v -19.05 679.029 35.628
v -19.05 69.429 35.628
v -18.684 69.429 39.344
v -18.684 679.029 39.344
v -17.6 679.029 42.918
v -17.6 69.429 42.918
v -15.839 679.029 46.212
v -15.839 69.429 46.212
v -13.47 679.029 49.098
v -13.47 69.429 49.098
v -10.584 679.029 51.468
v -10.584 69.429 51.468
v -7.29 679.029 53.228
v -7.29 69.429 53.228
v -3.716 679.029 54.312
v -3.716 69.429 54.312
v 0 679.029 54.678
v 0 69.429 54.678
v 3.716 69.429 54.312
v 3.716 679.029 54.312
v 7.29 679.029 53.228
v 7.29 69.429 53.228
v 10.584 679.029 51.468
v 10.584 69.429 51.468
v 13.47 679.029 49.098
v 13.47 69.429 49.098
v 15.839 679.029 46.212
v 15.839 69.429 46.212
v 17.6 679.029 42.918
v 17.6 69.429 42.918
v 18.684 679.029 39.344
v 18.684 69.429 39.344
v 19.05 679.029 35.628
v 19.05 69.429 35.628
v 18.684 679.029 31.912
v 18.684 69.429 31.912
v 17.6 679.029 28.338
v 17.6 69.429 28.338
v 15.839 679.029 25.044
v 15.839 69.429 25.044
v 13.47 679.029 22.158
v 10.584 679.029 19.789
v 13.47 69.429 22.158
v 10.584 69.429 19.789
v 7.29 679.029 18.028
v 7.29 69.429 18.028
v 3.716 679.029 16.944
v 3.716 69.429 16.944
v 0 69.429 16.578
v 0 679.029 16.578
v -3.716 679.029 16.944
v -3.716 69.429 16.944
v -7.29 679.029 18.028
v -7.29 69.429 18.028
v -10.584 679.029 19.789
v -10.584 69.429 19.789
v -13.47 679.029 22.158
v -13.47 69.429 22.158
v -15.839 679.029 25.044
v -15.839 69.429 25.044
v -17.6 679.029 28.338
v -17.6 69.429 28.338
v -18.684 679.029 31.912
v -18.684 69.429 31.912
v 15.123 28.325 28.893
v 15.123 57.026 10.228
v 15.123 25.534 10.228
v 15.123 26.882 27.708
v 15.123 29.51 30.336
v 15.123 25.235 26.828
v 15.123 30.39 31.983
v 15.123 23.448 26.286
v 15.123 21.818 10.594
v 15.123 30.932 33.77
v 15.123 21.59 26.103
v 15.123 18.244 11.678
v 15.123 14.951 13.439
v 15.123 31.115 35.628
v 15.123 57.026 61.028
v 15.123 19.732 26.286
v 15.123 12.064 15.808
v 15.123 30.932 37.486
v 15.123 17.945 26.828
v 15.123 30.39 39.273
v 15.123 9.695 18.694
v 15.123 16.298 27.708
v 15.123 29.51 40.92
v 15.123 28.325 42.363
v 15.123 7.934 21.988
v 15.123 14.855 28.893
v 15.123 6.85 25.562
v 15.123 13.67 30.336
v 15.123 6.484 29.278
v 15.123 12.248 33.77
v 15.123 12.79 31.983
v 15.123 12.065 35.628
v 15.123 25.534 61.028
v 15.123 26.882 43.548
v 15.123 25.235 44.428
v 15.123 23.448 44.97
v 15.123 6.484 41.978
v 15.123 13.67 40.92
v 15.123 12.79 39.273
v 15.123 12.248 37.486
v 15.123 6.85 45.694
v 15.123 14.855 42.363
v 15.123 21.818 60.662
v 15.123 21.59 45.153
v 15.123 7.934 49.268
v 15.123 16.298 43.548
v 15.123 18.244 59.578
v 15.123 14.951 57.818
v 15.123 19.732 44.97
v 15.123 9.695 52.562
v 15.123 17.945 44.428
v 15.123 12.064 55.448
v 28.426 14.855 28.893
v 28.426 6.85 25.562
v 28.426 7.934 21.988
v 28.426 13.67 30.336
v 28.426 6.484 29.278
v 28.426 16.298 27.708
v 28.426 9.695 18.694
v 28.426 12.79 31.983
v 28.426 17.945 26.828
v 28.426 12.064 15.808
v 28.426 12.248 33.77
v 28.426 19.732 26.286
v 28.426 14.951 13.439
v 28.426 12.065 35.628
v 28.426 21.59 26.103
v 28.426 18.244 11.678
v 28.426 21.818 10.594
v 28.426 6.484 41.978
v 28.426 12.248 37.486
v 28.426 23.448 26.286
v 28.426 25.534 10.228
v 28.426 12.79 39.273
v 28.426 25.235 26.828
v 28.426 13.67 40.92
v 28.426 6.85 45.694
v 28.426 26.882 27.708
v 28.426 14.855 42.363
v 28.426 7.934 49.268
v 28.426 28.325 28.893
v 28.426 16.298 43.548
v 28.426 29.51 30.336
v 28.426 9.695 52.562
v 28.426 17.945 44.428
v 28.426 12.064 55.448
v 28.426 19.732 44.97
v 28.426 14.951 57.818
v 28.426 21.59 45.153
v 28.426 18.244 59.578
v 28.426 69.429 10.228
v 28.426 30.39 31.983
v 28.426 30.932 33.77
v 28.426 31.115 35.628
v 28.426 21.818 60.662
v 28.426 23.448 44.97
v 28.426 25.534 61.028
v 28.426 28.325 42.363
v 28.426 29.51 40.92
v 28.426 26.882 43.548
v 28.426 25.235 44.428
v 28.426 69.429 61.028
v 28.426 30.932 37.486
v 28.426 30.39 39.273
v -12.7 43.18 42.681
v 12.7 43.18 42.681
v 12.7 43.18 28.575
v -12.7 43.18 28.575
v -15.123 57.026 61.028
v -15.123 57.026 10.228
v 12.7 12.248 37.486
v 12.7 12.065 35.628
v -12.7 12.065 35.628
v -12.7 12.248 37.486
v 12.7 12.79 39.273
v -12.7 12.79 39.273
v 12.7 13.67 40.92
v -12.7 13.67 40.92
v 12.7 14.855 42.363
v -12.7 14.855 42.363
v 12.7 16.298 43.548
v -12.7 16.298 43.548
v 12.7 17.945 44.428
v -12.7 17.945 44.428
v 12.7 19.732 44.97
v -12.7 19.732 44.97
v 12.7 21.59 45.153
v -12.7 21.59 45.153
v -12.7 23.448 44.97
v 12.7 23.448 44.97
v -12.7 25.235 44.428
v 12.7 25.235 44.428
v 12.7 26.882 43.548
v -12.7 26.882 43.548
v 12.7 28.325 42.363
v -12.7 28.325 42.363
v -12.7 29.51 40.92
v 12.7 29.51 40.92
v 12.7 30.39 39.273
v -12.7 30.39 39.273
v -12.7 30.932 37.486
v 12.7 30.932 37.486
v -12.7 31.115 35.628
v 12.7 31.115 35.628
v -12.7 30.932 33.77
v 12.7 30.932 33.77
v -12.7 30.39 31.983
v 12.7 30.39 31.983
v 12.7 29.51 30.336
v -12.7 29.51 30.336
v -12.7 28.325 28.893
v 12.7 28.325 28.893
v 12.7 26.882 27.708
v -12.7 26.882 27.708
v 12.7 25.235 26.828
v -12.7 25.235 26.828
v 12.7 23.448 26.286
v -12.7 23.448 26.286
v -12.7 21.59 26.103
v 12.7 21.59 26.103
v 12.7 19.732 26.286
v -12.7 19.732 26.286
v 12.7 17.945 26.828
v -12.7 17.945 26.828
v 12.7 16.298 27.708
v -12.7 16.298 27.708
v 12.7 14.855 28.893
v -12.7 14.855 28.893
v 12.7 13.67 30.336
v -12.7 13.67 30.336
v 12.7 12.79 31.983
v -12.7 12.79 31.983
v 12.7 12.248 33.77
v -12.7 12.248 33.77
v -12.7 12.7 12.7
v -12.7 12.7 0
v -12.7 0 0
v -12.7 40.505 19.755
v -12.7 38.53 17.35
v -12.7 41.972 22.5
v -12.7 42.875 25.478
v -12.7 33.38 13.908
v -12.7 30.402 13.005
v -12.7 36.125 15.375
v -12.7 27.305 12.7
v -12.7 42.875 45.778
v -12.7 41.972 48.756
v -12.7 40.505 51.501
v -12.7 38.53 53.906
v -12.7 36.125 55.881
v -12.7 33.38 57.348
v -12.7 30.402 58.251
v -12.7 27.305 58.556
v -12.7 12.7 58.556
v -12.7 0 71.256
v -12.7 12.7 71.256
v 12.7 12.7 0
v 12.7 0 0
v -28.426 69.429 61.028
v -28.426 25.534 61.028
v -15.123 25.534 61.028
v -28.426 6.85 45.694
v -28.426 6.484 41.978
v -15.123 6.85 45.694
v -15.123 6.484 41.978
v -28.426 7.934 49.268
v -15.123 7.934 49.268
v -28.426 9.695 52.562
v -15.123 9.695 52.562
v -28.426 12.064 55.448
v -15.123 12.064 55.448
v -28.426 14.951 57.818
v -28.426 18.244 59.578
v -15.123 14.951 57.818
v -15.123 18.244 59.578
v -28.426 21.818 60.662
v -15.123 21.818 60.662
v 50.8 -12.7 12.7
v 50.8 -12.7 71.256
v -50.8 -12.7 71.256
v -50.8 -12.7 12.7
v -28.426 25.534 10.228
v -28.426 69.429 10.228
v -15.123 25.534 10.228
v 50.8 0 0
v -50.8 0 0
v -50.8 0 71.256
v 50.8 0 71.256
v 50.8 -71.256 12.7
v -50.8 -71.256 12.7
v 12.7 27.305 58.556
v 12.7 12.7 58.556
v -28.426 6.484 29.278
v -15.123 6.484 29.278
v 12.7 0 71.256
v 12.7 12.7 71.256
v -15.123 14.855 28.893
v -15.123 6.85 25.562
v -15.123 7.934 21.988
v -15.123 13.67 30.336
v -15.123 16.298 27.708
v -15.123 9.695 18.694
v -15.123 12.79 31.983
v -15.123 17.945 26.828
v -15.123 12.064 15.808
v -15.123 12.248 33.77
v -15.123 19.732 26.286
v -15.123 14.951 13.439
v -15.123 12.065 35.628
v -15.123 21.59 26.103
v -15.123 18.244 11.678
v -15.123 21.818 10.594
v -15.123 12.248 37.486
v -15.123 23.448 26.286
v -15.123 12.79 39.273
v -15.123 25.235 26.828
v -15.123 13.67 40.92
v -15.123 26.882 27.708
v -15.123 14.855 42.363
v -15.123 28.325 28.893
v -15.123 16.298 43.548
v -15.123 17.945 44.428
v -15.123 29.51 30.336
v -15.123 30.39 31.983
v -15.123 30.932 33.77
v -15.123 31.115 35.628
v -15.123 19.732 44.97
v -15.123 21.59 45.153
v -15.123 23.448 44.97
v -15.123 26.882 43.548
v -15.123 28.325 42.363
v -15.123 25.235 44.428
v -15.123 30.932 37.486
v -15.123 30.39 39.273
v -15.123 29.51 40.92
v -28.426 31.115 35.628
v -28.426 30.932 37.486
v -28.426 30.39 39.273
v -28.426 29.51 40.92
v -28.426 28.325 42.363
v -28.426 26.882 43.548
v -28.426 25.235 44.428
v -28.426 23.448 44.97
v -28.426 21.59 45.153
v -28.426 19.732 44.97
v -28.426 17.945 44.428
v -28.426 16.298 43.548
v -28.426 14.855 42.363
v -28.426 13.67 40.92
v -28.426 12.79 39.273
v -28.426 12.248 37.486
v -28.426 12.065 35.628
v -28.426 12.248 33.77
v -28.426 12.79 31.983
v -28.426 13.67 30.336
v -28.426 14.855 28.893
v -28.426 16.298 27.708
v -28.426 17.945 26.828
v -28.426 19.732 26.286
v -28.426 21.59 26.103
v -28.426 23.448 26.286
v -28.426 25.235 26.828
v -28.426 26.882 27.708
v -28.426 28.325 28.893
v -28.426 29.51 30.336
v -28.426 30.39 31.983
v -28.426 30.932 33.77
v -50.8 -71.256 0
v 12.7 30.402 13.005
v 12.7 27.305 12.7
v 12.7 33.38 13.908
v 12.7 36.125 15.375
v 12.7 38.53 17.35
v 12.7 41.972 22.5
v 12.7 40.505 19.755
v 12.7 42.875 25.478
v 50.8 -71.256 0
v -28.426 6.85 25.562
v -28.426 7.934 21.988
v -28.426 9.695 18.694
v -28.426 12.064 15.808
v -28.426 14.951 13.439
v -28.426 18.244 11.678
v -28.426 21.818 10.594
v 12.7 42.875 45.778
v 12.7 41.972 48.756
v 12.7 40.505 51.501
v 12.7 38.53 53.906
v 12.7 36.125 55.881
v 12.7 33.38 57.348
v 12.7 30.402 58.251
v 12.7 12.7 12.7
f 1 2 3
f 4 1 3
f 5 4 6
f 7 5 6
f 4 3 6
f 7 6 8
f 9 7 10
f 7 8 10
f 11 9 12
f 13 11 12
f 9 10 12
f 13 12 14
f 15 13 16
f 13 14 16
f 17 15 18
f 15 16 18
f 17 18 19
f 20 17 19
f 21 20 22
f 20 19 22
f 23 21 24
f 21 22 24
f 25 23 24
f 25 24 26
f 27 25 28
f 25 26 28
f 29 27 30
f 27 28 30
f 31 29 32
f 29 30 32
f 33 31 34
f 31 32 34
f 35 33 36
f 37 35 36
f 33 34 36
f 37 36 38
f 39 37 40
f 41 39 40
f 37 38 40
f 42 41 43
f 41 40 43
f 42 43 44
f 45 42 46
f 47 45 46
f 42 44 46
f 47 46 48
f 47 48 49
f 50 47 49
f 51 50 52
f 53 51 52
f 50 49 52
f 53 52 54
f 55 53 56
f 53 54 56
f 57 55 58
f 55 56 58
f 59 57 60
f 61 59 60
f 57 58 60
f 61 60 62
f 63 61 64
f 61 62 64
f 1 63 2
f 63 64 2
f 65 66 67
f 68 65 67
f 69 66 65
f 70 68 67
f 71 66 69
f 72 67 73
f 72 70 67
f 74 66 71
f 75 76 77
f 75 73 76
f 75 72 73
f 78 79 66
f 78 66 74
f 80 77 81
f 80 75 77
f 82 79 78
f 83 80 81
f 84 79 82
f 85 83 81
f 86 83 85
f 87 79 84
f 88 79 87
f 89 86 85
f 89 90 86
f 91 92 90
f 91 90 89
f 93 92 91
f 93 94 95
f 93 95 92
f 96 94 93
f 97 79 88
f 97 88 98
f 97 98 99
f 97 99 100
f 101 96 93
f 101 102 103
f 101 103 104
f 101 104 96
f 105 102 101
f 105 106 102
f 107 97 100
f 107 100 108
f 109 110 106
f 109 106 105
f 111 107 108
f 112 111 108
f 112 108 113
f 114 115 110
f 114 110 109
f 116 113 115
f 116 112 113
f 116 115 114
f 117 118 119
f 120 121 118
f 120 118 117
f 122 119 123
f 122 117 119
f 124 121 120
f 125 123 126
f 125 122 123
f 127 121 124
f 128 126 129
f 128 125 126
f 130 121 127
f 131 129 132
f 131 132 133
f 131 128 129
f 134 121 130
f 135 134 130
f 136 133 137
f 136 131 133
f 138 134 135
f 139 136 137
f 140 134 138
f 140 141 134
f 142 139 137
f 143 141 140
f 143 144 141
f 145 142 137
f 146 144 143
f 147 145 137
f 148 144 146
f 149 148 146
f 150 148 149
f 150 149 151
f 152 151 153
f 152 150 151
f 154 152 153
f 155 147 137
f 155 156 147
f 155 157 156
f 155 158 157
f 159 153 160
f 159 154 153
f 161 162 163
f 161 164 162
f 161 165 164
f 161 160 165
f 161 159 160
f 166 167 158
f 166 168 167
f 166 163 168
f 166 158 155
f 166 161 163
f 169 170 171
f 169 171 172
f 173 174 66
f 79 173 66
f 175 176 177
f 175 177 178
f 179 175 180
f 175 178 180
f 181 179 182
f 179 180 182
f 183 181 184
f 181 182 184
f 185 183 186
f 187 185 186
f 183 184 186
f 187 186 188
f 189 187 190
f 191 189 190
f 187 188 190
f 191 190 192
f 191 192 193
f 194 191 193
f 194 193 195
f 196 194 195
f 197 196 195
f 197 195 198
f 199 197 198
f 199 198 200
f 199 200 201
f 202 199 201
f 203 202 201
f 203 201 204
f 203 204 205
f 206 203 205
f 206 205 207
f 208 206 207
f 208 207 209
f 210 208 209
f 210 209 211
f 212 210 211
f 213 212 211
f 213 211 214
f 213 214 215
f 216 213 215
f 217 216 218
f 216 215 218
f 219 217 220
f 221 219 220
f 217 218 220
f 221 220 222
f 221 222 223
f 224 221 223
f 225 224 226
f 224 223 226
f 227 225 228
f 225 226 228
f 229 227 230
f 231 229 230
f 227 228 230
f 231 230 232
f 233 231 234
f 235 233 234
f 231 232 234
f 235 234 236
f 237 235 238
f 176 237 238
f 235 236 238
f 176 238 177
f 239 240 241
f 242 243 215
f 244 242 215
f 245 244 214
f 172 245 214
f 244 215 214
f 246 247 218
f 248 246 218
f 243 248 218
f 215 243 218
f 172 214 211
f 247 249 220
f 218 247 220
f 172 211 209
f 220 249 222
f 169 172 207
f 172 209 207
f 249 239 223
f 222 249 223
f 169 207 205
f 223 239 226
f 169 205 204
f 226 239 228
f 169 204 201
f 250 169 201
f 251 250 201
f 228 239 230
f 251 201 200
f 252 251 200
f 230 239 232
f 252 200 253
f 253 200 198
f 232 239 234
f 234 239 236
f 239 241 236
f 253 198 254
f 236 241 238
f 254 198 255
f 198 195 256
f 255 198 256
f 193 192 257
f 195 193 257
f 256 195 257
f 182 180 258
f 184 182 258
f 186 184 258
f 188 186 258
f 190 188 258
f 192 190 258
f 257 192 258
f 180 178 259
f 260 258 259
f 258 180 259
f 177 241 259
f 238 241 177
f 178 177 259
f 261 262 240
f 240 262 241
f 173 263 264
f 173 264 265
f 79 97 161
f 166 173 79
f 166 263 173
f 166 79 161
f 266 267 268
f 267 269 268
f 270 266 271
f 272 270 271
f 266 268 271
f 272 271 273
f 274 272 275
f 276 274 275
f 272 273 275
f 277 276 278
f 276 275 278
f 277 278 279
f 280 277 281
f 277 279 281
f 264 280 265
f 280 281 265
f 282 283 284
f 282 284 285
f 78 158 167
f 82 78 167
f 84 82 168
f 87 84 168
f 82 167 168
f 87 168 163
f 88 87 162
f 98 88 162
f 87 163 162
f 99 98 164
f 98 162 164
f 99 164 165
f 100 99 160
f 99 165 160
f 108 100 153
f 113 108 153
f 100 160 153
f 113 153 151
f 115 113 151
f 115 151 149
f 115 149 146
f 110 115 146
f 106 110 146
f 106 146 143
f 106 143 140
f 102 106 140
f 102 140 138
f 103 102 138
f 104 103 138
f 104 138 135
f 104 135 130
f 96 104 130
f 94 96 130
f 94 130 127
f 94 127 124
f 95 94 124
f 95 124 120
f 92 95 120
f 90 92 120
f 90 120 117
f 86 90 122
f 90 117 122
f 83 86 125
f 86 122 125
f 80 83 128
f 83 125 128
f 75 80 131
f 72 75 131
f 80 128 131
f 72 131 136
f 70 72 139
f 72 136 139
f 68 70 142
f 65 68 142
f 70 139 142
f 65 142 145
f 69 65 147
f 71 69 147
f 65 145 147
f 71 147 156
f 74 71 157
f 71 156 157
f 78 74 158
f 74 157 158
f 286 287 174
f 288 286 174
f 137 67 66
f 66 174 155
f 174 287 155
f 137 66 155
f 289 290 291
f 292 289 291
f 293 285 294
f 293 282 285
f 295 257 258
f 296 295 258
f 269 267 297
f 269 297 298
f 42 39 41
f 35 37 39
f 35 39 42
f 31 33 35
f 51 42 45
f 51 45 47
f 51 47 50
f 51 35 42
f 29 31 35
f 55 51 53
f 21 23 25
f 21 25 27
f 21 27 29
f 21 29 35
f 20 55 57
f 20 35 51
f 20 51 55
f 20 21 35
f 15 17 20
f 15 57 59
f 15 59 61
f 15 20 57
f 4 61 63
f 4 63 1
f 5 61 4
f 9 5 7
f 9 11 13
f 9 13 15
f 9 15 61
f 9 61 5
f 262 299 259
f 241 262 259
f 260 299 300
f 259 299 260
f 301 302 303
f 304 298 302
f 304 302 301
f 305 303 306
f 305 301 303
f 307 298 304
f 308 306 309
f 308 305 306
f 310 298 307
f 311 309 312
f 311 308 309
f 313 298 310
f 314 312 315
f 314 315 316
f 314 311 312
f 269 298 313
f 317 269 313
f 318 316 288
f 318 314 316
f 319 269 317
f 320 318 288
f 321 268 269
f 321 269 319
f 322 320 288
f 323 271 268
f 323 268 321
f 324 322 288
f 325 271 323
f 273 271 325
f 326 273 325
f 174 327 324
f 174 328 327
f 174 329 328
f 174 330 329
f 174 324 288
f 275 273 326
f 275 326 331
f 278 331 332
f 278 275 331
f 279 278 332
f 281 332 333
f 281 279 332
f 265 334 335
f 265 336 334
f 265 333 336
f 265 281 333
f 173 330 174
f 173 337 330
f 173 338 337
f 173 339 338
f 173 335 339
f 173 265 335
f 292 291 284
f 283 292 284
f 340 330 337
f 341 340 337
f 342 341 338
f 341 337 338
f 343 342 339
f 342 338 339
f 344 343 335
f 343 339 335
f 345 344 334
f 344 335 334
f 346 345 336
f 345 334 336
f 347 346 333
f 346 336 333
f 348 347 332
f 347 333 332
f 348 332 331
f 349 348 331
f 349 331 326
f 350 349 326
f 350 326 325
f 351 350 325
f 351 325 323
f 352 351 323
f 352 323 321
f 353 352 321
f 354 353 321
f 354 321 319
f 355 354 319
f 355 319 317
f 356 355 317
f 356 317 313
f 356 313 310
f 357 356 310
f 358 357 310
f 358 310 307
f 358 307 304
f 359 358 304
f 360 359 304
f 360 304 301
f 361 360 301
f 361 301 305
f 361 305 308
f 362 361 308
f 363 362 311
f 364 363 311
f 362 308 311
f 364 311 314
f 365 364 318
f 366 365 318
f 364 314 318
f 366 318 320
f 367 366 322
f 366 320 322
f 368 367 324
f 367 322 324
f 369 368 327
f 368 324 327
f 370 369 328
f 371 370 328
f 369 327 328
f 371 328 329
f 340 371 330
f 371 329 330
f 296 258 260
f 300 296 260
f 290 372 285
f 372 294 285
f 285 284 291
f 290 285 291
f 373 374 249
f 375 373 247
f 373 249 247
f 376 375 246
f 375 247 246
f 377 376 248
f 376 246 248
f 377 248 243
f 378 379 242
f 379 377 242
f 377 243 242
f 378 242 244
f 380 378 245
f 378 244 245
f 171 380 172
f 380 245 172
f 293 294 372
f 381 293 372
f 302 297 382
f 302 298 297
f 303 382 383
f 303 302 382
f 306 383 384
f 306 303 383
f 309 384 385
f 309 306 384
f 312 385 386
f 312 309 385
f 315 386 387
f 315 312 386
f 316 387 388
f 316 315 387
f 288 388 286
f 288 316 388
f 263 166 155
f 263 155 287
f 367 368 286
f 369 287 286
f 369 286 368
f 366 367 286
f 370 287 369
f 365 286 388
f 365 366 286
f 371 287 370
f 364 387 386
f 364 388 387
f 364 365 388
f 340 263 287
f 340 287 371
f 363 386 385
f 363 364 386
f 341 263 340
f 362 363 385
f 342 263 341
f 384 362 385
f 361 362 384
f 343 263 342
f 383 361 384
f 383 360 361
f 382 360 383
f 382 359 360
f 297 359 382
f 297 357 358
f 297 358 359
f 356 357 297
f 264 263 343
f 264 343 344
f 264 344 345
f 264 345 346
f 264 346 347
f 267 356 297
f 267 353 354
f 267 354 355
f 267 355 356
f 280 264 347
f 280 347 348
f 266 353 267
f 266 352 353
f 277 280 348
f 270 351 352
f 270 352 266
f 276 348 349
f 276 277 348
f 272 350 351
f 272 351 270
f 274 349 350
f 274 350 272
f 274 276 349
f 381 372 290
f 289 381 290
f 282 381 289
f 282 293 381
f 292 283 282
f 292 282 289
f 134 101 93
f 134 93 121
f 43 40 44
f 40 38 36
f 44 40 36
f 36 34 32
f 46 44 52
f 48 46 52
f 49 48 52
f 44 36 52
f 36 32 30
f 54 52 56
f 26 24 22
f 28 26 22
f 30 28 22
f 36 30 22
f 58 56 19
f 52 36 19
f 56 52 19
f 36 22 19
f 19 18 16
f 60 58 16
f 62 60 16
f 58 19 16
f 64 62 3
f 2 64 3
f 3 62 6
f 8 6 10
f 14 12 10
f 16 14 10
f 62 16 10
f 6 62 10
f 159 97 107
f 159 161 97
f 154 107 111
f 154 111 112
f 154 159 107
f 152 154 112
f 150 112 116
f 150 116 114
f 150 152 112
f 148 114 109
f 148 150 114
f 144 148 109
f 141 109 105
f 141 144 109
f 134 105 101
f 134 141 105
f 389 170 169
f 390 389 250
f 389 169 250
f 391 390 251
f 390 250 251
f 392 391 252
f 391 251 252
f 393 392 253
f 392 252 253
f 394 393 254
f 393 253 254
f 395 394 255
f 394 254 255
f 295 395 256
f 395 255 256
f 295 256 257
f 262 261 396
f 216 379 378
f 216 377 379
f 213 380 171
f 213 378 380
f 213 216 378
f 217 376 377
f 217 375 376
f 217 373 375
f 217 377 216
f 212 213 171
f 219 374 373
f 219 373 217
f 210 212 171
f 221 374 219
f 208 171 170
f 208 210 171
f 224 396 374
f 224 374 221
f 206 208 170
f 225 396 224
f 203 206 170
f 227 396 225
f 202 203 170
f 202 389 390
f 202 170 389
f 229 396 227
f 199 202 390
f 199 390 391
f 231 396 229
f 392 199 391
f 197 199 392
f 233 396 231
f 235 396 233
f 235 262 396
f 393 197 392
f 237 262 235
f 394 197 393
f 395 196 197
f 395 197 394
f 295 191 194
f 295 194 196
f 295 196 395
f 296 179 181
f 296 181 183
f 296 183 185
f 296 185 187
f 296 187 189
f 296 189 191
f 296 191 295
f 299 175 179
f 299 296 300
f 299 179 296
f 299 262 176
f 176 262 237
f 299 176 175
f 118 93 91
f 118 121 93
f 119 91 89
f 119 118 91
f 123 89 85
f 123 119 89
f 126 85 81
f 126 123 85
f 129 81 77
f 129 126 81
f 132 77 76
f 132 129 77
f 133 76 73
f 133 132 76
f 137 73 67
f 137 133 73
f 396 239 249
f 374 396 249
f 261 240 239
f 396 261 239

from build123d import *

# Parameters (mm, degrees)
F1_DEPTH  = 50.8
F2_W      = 25.4
F2_H      = 71.2560223817
F3_DEPTH  = 43.18
F4_R      = 9.525
F5_DEPTH  = 63.501
F7_DEPTH  = 63.501
F10_DEPTH = 25.4
F11_R     = 19.05
F12_R     = 9.525
F13_DEPTH = 79.2273342619
F14_R     = 19.05
F15_DEPTH = 609.6


with BuildPart() as f1:
    # F0 (on Right) → F1 (new body, symmetric)
    with BuildSketch(Plane.YZ):
        Polygon((-71.2560223817, 0), (0, 0), (0, 71.2560223817), (-12.7, 71.2560223817), (-12.7, 12.7), (-71.2560223817, 12.7), align=None)
    extrude(amount=F1_DEPTH, both=True)


with BuildPart() as f3:
    # F2 (on face) → F3 (new body)
    with BuildSketch(Plane(origin=(0, 0, 0), x_dir=(-1, 0, 0), z_dir=(0, 1, 0))):
        with Locations((0, 35.6280111909)):
            Rectangle(F2_W, F2_H)
    extrude(amount=F3_DEPTH)

    # F4 (on face) → F5 (cut, through all)
    with BuildSketch(Plane(origin=(-12.7, 0, 0), x_dir=(0, -1, 0), z_dir=(-1, 0, 0))):
        with Locations((-21.59, 35.6280111909)):
            Circle(F4_R)
    extrude(amount=-F5_DEPTH, mode=Mode.SUBTRACT)

    # F6 (on face) → F7 (cut, through all)
    with BuildSketch(Plane(origin=(-12.7, 0, 0), x_dir=(0, -1, 0), z_dir=(-1, 0, 0))):
        with BuildLine():
            ThreePointArc((-27.305, 12.7), (-38.5303201513, 17.3496798487), (-43.18, 28.575))
            Line((-43.18, 28.575), (-43.18, 0))
            Line((-43.18, 0), (-12.7, 0))
            Line((-12.7, 0), (-12.7, 12.7))
            Line((-12.7, 12.7), (-27.305, 12.7))
        make_face()
        with BuildLine():
            Line((-12.7, 58.5560223817), (-12.7, 71.2560223817))
            Line((-12.7, 71.2560223817), (-43.18, 71.2560223817))
            Line((-43.18, 71.2560223817), (-43.18, 42.6810223817))
            ThreePointArc((-43.18, 42.6810223817), (-38.5303201513, 53.9063425331), (-27.305, 58.5560223817))
            Line((-27.305, 58.5560223817), (-12.7, 58.5560223817))
        make_face()
    extrude(amount=-F7_DEPTH, mode=Mode.SUBTRACT)


with BuildPart() as f10:
    # F9 (on mid) → F10 (new body, symmetric)
    with BuildSketch(Plane.XY.offset(35.6280111909)):
        Polygon((15.1226995513, 57.0255741477), (15.1226995513, 6.4842337742), (28.4263342619, 6.4842337742), (28.4263342619, 69.4291517138), (-28.4263342619, 69.4291517138), (-28.4263342619, 6.4842337742), (-15.1226995513, 6.4842337742), (-15.1226995513, 57.0255741477), align=None)
    extrude(amount=F10_DEPTH, both=True)

    # F11
    f11_edges = [f10.edges().sort_by_distance(p)[0] for p in [
        (21.774517, 6.484234, 61.028011),
        (-21.774517, 6.484234, 61.028011),
        (21.774517, 6.484234, 10.228011),
        (-21.774517, 6.484234, 10.228011),
    ]]
    fillet(f11_edges, radius=F11_R)

    # F12 (on face) → F13 (cut, through all)
    with BuildSketch(Plane.YZ.offset(28.4263342619)):
        with Locations((21.59, 35.6280111909)):
            Circle(F12_R)
    extrude(amount=-F13_DEPTH, mode=Mode.SUBTRACT)


with BuildPart() as f15:
    # F14 (on face) → F15 (new body)
    with BuildSketch(Plane(origin=(0, 69.4291517138, 0), x_dir=(-1, 0, 0), z_dir=(0, 1, 0))):
        with Locations((0, 35.6280111909)):
            Circle(F14_R)
    extrude(amount=F15_DEPTH)


solid = Compound([f1.part, f3.part, f10.part, f15.part])
